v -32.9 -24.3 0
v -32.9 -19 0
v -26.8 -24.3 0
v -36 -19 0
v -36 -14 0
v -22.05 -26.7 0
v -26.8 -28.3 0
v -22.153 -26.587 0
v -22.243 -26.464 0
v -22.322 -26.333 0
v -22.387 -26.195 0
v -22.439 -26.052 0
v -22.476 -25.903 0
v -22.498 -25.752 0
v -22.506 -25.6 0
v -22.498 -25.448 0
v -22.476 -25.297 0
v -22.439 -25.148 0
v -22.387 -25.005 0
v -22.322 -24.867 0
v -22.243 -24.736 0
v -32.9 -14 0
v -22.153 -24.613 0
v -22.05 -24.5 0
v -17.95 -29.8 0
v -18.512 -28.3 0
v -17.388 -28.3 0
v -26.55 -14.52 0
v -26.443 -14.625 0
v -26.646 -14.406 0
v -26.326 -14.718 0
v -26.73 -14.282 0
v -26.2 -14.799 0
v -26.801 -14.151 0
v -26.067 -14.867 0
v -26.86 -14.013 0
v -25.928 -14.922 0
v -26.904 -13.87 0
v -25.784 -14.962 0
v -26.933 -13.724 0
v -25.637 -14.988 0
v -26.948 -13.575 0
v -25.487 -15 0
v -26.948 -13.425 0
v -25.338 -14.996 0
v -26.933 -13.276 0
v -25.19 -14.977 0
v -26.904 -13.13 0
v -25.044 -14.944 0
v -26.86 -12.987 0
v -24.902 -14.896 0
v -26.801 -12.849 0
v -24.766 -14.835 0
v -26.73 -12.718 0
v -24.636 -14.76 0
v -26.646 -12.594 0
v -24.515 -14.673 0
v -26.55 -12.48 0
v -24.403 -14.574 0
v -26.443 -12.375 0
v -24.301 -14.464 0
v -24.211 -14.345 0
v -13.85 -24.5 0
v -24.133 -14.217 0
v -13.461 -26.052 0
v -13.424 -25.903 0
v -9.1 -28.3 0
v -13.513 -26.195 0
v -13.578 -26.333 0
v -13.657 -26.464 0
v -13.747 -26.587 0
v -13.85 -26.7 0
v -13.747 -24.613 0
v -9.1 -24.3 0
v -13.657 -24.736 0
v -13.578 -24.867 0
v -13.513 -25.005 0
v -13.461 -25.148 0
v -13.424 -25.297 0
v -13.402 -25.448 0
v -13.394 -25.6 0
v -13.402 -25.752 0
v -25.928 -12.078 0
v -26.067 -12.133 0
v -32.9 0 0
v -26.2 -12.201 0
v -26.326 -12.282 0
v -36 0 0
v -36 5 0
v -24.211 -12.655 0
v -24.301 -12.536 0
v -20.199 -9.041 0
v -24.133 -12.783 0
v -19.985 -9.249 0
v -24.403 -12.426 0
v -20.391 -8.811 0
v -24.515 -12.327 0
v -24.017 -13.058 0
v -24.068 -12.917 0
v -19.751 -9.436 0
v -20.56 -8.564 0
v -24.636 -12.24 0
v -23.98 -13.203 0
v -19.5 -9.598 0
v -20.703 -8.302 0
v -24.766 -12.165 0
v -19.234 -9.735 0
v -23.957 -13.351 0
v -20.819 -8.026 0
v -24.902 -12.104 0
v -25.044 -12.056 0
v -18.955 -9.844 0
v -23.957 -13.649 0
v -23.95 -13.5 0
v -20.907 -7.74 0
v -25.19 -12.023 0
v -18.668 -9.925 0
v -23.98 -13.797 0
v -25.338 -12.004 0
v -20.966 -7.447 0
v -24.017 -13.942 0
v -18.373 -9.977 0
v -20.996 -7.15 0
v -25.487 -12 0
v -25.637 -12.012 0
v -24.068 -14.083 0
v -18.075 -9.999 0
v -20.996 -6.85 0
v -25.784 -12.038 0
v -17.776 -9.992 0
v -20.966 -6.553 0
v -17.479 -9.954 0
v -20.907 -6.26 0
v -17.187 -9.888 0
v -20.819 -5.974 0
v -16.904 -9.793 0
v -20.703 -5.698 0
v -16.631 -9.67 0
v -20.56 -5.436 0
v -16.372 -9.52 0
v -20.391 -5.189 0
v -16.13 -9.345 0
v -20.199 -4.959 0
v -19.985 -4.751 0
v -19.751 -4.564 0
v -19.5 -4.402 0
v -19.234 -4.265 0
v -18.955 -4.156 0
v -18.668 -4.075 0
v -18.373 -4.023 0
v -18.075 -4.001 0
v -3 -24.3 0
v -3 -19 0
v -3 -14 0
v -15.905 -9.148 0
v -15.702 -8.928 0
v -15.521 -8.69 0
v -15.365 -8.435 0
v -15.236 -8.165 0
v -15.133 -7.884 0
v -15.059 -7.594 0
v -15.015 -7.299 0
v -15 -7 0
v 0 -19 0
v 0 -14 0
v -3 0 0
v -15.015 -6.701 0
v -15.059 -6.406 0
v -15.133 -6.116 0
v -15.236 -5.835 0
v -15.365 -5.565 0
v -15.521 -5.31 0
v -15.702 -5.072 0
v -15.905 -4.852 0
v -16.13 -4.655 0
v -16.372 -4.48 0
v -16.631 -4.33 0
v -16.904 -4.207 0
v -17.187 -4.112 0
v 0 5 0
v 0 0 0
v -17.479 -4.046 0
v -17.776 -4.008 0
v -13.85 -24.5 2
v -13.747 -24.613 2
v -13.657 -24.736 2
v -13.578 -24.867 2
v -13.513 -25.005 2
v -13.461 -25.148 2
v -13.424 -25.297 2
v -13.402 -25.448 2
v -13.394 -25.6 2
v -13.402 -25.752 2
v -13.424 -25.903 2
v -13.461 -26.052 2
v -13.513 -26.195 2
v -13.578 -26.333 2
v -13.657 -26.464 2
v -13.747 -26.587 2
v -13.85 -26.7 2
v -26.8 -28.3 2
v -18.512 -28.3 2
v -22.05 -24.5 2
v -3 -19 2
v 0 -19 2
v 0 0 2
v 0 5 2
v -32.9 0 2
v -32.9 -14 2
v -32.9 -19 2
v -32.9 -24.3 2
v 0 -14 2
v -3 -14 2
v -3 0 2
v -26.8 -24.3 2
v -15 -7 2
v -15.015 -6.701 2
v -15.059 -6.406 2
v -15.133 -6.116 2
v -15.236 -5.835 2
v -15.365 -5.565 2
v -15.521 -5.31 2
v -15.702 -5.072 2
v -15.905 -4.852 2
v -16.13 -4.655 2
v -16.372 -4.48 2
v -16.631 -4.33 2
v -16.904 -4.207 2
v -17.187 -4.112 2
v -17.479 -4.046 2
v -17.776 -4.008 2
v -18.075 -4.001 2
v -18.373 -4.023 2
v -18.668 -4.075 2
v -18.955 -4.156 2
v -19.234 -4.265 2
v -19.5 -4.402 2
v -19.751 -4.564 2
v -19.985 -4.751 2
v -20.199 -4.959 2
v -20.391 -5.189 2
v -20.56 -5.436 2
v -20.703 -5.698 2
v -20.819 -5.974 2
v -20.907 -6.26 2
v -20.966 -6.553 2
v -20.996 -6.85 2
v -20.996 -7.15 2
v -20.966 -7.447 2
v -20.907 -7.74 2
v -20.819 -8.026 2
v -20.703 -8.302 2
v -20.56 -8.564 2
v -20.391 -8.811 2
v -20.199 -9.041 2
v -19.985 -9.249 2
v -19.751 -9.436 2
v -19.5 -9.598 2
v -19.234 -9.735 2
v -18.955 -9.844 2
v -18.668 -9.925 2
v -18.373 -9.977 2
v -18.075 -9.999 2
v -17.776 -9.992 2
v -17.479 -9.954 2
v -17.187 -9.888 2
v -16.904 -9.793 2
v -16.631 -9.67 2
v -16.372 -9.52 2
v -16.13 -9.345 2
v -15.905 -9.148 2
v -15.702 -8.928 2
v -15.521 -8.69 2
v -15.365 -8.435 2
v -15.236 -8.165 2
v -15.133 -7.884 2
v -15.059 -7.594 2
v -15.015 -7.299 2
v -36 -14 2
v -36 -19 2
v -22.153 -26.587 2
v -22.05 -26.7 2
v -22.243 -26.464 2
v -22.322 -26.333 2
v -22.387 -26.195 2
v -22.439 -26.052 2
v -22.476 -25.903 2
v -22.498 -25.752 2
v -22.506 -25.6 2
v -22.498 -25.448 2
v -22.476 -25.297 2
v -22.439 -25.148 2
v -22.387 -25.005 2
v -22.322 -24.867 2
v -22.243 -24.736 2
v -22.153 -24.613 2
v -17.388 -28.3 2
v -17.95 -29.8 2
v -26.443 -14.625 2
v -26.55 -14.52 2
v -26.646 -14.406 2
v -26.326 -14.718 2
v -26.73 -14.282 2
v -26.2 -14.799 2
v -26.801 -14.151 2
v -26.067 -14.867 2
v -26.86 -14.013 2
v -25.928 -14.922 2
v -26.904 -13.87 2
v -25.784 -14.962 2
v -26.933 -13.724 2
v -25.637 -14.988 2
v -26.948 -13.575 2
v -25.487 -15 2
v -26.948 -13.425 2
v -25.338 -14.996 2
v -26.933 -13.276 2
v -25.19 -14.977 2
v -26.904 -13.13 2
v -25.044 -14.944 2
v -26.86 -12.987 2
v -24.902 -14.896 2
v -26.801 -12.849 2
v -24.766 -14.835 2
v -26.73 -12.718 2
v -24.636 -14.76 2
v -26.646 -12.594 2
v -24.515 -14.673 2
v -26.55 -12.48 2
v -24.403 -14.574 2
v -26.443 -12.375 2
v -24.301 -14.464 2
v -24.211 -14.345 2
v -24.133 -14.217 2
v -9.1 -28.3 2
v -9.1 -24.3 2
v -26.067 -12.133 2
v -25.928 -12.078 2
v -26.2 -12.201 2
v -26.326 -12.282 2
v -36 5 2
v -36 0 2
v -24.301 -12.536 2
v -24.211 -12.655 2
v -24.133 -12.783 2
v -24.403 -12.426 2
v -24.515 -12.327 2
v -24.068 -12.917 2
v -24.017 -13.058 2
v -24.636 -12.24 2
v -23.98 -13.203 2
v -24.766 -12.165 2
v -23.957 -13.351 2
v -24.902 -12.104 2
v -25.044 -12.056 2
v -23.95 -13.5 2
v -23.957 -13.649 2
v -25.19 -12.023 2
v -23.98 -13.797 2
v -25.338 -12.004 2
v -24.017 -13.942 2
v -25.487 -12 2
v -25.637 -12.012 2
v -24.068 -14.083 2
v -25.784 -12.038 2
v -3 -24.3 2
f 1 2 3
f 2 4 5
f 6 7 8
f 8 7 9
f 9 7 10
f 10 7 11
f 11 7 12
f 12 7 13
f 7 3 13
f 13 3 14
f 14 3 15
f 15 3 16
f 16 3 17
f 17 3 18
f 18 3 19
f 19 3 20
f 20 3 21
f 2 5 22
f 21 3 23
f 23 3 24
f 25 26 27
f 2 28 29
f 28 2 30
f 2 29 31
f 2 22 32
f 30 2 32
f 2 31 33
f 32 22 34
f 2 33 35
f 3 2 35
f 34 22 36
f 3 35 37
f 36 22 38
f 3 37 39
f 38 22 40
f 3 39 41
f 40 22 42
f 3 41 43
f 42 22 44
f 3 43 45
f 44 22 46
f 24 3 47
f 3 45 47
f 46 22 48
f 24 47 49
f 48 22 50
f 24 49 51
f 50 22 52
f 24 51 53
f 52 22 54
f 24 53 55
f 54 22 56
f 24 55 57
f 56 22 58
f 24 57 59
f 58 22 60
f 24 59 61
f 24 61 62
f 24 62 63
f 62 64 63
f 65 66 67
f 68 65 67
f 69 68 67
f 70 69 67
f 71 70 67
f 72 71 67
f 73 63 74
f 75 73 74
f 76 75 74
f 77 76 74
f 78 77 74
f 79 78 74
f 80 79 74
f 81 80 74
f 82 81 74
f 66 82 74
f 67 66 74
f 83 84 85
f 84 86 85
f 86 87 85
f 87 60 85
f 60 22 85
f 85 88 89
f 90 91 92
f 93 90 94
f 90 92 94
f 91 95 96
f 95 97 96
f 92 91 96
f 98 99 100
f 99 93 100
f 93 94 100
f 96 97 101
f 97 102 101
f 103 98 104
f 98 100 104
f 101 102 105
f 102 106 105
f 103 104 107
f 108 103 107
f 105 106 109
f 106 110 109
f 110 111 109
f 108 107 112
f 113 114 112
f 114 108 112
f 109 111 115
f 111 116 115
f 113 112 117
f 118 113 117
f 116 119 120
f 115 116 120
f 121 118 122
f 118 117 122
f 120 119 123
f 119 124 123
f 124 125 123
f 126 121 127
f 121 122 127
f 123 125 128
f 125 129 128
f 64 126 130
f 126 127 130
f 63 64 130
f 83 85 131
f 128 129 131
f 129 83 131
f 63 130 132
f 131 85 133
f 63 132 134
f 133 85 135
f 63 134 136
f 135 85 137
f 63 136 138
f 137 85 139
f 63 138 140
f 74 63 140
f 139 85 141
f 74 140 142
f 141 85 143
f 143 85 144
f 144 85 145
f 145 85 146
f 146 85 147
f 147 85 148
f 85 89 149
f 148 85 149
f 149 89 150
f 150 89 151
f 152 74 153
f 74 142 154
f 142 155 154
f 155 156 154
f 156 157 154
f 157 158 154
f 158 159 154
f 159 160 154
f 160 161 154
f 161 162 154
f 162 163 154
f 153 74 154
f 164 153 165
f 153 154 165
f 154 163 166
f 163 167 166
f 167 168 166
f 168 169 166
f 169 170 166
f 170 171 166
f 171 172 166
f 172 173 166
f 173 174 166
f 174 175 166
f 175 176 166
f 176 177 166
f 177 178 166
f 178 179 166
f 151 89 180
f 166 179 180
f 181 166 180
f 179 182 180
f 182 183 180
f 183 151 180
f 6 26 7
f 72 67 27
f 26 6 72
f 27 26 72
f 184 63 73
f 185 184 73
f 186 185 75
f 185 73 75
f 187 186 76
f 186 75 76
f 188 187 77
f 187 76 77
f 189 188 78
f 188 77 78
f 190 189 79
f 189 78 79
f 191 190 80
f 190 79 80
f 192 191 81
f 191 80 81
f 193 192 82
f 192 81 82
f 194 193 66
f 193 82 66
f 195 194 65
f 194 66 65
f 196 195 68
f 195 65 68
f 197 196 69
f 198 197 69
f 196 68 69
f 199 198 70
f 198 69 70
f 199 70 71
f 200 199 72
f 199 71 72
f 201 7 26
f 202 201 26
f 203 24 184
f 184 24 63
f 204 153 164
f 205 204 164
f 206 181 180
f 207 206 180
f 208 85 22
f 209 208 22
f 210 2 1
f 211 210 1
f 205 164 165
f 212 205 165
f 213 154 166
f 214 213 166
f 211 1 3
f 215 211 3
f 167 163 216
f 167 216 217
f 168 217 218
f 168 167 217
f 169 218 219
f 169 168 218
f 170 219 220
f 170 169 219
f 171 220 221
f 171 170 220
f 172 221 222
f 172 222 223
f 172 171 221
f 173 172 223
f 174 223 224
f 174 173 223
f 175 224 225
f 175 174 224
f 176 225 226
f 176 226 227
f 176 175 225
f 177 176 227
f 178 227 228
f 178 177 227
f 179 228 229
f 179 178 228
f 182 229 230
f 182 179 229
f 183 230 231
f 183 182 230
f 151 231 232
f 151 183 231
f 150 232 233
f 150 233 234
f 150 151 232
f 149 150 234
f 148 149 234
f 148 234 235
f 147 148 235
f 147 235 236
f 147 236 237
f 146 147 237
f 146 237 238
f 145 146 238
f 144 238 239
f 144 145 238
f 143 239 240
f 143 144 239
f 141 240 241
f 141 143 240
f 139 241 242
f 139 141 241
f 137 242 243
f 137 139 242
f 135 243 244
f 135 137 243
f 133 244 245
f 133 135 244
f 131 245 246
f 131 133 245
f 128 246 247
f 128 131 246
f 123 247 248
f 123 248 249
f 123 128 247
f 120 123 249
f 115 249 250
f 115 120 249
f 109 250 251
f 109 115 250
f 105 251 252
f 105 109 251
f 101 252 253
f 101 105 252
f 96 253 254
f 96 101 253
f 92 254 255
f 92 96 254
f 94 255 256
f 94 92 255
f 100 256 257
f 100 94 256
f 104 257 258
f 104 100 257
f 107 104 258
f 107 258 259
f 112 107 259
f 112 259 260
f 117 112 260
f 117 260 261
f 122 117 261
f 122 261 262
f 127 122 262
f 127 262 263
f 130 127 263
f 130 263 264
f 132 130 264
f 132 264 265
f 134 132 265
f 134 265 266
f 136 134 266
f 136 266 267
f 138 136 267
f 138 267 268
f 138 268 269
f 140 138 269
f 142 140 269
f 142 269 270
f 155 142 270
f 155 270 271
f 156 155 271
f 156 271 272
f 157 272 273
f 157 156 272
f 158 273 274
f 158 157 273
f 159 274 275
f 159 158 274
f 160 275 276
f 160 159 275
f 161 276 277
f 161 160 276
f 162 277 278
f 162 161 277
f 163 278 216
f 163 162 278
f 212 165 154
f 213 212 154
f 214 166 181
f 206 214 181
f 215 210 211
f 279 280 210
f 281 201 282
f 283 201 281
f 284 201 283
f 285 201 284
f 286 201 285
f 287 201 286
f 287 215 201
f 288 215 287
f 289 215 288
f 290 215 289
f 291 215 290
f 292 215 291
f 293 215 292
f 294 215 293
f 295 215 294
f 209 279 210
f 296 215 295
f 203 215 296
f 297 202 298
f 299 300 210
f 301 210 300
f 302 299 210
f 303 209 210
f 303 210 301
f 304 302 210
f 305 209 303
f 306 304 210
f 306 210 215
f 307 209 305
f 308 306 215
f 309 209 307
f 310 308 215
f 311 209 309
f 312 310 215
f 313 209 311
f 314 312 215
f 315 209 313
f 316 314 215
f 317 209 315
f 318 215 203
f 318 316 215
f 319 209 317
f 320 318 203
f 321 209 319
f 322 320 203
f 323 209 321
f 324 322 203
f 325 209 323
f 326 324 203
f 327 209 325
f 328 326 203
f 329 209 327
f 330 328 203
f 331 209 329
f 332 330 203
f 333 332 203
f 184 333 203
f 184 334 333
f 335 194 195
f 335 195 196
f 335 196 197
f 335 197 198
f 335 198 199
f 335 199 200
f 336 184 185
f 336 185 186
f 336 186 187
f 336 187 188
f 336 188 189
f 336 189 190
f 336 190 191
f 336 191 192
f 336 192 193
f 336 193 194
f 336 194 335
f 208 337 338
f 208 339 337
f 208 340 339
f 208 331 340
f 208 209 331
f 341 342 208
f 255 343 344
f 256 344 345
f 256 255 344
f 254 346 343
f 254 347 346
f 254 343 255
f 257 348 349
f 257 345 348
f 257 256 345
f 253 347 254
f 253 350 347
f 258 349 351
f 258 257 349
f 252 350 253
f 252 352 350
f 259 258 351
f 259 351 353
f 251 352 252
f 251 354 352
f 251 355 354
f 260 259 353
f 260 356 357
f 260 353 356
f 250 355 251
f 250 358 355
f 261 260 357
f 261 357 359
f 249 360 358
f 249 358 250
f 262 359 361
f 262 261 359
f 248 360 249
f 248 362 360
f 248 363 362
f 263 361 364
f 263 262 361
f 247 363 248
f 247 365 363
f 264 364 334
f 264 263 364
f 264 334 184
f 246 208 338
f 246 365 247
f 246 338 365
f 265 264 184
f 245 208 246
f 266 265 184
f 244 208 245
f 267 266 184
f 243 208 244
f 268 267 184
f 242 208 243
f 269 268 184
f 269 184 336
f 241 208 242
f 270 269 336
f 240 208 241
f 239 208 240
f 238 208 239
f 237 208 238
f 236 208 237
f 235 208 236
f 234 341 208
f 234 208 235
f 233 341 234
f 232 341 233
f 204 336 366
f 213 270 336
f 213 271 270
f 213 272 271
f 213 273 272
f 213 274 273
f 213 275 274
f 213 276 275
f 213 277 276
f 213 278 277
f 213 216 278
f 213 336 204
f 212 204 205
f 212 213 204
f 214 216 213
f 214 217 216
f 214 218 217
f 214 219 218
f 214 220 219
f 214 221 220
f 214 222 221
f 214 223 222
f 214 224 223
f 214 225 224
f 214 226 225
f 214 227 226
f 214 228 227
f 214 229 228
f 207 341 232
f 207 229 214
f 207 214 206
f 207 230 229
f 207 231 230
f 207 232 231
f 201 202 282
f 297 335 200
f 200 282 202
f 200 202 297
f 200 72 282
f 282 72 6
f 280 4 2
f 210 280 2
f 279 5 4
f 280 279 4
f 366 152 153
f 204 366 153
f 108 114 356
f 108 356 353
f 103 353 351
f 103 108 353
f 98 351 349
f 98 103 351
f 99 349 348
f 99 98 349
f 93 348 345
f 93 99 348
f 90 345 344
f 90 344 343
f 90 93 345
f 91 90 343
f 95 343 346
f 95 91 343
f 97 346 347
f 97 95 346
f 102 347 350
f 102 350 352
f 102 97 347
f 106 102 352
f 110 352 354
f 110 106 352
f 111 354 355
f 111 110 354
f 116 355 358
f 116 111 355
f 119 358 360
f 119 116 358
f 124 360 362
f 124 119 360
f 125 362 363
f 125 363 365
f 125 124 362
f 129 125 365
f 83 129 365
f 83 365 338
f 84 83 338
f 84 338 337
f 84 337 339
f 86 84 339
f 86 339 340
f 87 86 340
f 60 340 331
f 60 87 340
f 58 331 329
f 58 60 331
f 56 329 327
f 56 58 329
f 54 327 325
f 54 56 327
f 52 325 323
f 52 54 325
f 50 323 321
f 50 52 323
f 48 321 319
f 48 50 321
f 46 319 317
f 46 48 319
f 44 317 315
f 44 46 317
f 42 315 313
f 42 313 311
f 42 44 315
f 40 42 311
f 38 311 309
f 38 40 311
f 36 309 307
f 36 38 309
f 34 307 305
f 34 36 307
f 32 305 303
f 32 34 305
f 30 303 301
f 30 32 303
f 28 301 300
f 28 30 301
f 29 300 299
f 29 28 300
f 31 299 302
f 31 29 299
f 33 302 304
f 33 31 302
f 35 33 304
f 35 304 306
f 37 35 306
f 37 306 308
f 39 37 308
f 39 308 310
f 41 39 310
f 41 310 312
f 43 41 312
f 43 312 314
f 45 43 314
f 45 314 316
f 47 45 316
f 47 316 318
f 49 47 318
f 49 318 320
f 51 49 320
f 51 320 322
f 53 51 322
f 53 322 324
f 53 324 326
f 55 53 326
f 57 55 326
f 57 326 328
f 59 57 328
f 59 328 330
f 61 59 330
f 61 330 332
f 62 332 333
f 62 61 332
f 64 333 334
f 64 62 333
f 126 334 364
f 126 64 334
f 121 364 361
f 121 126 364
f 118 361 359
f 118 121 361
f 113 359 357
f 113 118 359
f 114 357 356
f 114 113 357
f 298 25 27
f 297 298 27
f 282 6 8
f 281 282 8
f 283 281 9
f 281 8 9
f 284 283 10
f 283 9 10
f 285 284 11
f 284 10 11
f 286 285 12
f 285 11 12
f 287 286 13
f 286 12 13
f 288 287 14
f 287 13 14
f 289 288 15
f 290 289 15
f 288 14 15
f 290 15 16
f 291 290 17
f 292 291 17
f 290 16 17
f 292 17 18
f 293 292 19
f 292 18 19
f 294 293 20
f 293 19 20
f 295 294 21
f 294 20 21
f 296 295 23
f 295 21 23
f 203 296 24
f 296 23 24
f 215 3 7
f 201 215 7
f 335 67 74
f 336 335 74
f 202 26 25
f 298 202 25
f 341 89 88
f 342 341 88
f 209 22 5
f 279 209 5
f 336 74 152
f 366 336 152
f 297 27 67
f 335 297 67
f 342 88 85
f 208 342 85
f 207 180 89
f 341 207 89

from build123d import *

# Parameters (mm, degrees)
SKETCH_1_R      = 3
SKETCH_1_R_2    = 1.5
EXTRUDE_1_DEPTH = 2


with BuildPart() as part:
    # 草图1 → 凸台-拉伸1 (new body)
    with BuildSketch(Plane.XY):
        Polygon((0, 0), (0, 5), (-3, 5), (-33, 5), (-36, 5), (-36, 0), (-33, 0), (-32.9, 0), (-32.9, -14), (-33, -14), (-36, -14), (-36, -19), (-33, -19), (-32.9, -19), (-32.9, -24.3), (-26.8, -24.3), (-26.8, -28.3), (-18.511559339, -28.3), (-17.95, -29.8), (-17.388440661, -28.3), (-9.1, -28.3), (-9.1, -24.3), (-3, -24.3), (-3, -19), (0, -19), (0, -14), (-3, -14), (-3, 0), align=None)
        with Locations((-18, -7)):
            Circle(SKETCH_1_R, mode=Mode.SUBTRACT)
        with Locations((-25.45, -13.5)):
            Circle(SKETCH_1_R_2, mode=Mode.SUBTRACT)
        with BuildLine():
            Line((-22.05, -24.5), (-13.85, -24.5))
            ThreePointArc((-13.85, -24.5), (-13.394365081, -25.6), (-13.85, -26.7))
            Line((-13.85, -26.7), (-22.05, -26.7))
            ThreePointArc((-22.05, -26.7), (-22.505634919, -25.6), (-22.05, -24.5))
        make_face(mode=Mode.SUBTRACT)
    extrude(amount=EXTRUDE_1_DEPTH)


solid = part.part
